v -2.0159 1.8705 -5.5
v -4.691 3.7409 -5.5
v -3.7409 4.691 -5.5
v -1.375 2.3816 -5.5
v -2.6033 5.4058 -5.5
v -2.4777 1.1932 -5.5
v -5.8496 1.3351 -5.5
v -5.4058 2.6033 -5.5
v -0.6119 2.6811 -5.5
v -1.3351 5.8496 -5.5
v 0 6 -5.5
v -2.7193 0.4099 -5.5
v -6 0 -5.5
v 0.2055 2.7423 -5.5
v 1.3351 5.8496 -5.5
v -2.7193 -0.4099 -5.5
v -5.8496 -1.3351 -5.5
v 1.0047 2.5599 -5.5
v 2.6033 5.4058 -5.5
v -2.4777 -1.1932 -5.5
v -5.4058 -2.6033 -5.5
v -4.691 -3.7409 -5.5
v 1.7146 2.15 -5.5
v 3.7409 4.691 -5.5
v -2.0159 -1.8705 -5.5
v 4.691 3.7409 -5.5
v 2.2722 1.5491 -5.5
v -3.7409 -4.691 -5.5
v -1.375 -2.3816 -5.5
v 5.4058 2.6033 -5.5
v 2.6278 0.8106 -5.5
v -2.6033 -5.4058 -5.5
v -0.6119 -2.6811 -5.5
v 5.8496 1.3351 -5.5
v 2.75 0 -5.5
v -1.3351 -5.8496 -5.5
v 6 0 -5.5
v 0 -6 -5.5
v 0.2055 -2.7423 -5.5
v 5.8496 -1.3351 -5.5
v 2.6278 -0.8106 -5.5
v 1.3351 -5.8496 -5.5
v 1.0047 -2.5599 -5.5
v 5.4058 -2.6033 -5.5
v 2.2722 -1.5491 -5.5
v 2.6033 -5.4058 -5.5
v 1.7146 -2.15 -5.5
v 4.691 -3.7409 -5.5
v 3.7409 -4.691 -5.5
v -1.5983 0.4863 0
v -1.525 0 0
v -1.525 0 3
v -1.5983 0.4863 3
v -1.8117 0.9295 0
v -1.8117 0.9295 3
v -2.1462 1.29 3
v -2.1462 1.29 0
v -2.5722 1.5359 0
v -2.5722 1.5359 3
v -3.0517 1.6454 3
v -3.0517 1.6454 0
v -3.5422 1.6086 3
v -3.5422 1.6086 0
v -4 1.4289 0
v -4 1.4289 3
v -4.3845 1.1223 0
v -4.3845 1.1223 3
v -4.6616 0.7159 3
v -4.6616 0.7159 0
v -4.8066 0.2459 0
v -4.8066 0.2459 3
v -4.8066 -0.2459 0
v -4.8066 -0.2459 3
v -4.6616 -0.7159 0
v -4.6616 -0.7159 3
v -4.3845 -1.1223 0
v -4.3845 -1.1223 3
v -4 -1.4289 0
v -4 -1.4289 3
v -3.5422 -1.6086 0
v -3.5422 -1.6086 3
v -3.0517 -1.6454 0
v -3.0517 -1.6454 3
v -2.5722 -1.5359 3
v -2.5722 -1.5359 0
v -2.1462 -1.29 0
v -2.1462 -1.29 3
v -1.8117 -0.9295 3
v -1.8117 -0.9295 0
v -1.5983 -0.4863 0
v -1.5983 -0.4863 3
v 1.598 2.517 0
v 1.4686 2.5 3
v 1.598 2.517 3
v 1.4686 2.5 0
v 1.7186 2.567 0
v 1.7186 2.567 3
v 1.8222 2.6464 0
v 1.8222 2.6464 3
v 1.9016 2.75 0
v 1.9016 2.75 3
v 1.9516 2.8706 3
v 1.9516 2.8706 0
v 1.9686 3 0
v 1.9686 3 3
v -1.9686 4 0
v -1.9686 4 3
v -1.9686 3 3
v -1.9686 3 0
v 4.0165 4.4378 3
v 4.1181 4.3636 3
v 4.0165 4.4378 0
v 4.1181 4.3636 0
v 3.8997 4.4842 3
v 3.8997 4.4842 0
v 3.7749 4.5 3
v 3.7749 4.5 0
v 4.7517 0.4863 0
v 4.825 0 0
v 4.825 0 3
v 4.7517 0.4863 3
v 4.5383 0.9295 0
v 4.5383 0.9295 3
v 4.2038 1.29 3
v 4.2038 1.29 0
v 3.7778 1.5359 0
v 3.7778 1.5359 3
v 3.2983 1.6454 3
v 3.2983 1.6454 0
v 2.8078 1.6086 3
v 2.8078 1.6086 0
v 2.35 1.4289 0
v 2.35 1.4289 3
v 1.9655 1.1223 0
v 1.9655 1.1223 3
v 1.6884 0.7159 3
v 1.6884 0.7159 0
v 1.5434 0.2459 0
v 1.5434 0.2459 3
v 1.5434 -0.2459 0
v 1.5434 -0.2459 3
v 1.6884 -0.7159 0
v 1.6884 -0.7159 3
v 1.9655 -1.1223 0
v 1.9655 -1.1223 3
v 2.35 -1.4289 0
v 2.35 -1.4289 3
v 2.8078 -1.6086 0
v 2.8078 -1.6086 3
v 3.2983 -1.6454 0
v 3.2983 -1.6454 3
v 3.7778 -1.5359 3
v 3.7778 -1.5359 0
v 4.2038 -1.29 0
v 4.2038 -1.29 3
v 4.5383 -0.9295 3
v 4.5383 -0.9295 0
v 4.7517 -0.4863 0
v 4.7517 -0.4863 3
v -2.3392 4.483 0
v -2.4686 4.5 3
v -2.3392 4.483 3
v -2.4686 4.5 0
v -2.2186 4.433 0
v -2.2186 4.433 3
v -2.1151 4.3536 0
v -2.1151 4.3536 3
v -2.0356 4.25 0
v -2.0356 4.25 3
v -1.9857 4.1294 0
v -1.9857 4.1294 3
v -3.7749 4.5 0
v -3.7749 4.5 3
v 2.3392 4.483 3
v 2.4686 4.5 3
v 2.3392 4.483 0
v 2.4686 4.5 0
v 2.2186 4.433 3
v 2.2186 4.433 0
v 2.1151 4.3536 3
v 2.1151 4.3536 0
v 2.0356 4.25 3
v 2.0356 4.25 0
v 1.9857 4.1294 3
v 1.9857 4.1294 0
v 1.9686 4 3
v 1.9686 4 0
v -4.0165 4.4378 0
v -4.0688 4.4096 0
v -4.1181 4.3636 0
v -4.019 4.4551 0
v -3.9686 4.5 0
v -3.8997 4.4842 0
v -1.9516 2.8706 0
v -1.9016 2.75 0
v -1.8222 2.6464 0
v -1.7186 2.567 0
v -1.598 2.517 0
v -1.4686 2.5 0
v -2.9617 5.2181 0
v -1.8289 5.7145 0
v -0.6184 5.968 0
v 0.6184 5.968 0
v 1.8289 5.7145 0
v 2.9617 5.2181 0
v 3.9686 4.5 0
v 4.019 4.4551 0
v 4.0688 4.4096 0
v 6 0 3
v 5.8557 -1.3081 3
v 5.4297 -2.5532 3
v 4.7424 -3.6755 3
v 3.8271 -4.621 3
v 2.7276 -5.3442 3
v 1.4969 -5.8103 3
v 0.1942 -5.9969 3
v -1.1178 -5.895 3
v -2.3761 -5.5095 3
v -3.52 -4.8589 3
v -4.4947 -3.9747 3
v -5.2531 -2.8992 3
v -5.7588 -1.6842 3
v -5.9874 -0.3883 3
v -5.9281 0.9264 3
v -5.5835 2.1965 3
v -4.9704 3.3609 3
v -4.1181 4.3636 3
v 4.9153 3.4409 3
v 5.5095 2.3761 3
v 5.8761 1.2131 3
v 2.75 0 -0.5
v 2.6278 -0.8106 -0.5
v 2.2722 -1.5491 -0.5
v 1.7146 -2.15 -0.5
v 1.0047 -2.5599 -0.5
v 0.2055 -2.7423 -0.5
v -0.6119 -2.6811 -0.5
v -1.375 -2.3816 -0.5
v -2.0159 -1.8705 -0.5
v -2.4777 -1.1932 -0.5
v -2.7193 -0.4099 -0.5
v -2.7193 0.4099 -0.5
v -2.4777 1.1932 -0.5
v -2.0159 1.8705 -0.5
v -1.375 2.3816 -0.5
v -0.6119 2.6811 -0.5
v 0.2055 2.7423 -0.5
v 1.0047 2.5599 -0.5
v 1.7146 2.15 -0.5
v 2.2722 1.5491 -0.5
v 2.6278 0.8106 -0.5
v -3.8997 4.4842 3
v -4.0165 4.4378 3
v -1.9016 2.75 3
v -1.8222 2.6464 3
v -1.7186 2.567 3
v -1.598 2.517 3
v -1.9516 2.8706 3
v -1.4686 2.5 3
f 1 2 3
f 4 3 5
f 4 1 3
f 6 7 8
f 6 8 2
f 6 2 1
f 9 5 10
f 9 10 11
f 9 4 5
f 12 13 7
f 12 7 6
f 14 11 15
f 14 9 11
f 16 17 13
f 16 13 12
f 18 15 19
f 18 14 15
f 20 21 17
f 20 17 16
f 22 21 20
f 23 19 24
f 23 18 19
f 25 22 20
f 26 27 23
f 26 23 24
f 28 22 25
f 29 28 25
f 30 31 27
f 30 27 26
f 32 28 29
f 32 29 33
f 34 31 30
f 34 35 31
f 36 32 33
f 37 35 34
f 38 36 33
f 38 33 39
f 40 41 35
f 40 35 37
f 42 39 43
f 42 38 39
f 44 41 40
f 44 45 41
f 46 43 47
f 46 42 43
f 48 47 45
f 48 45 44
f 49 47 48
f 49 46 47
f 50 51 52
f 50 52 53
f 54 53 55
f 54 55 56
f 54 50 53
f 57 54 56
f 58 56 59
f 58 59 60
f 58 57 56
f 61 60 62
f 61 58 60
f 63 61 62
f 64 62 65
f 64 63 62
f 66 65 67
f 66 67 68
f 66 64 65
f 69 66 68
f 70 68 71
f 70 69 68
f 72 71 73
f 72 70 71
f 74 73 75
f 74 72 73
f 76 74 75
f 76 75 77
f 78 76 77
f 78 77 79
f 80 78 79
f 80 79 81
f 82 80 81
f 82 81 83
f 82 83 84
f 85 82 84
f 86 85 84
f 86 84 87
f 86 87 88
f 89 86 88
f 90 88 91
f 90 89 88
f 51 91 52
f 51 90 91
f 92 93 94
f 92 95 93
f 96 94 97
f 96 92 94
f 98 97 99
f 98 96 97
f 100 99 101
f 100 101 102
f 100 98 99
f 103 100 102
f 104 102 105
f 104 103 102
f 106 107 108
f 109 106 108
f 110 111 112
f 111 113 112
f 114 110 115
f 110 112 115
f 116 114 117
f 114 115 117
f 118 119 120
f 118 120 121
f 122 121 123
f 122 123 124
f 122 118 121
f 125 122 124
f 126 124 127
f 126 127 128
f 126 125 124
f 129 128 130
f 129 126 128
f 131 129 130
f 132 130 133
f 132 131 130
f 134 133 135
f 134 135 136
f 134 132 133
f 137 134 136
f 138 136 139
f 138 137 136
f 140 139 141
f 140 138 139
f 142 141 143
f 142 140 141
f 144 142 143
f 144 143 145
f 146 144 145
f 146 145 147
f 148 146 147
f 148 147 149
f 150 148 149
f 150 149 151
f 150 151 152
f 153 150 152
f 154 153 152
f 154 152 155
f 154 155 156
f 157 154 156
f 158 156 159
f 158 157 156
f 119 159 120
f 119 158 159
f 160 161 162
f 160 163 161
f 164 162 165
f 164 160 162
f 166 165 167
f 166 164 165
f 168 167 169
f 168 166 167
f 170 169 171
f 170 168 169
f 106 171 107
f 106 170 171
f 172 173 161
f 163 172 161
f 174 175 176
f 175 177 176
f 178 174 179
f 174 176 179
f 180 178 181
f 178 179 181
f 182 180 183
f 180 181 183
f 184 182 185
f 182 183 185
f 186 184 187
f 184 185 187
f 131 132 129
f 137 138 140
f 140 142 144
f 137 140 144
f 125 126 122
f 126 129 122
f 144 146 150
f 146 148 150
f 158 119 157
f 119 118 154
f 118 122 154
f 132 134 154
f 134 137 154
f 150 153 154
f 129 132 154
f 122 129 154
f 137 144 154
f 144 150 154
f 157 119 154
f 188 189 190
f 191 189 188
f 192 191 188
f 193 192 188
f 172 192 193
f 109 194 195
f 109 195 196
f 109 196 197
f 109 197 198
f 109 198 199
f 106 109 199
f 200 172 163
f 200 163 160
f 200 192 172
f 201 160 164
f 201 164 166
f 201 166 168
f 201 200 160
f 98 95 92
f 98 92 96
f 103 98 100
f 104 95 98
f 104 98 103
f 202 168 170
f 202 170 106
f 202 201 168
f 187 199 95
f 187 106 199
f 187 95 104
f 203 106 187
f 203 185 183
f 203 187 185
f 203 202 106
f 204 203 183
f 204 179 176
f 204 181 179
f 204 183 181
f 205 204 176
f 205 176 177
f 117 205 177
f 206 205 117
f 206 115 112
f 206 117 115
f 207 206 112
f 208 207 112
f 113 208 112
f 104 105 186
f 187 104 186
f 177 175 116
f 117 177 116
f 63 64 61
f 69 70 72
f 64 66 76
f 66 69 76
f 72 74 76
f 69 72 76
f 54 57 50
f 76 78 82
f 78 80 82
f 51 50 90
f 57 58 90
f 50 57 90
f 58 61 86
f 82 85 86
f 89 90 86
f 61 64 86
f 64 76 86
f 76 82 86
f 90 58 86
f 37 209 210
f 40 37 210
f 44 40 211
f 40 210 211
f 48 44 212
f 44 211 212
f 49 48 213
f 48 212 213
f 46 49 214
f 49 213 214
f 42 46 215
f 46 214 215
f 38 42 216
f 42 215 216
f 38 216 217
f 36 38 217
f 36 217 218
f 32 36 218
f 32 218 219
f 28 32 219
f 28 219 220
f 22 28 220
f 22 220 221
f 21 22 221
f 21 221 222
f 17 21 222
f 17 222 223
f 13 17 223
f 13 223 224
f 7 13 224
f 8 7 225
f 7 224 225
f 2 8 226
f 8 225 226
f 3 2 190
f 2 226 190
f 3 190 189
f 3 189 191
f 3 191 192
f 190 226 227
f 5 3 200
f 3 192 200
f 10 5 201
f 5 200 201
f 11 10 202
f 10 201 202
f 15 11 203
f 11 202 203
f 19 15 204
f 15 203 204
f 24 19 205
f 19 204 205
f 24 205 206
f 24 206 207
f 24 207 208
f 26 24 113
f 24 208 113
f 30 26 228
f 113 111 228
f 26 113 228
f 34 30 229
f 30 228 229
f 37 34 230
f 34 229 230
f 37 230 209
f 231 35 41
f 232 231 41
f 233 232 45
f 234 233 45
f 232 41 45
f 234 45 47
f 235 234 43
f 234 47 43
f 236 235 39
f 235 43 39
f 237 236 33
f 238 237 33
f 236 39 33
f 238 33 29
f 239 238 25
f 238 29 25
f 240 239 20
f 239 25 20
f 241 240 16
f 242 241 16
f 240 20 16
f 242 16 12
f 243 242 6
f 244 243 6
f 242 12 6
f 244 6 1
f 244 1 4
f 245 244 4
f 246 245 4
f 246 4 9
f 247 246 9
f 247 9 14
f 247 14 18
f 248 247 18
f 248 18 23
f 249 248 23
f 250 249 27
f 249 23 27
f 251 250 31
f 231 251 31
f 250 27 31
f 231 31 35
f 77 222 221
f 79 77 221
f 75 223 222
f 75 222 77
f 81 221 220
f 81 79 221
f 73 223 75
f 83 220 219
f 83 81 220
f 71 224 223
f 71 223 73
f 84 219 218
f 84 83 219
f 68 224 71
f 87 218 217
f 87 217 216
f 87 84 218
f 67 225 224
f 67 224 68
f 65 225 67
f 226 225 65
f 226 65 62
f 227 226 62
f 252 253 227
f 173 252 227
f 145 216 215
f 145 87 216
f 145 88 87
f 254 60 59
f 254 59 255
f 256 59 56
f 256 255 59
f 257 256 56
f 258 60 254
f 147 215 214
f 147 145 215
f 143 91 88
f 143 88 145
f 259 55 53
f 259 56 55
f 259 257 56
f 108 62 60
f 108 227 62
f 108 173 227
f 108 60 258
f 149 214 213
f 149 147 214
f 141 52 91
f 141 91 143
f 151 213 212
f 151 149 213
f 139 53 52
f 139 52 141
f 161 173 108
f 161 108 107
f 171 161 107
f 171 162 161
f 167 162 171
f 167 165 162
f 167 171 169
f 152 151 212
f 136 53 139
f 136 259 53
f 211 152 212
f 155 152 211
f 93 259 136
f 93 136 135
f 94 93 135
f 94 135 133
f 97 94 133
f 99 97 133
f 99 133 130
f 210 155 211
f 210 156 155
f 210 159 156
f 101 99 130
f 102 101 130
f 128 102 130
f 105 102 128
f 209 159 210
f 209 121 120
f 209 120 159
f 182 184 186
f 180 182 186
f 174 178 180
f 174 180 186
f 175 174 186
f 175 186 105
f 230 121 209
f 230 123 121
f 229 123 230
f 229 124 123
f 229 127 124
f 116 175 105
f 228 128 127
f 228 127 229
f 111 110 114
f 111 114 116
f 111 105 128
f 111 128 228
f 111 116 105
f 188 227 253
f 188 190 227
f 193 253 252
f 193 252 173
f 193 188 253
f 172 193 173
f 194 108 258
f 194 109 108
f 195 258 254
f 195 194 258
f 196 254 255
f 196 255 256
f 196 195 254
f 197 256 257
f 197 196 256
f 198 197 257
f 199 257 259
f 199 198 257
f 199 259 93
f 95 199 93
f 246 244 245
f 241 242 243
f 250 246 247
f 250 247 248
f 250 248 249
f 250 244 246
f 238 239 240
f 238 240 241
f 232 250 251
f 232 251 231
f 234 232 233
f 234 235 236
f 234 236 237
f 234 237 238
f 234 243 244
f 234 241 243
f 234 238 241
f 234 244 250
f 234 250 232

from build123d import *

# Parameters (mm, degrees)
F0_R     = 6
F0_R_2   = 1.65
F1_DEPTH = 3
F2_R     = 6
F3_DEPTH = 5.5
F5_DEPTH = 3
F6_R     = 0.5
F7_R     = 2.75
F8_DEPTH = 5


with BuildPart() as f1:
    # F0 (on Top) → F1 (new body)
    with BuildSketch(Plane.XY):
        Circle(F0_R)
        with Locations((-3.175, 0)):
            Circle(F0_R_2, mode=Mode.SUBTRACT)
        with Locations((3.175, 0)):
            Circle(F0_R_2, mode=Mode.SUBTRACT)
    extrude(amount=F1_DEPTH)

    # F2 (on face) → F3 (join)
    with BuildSketch(Plane(origin=(0, 0, 0), x_dir=(1, 0, 0), z_dir=(0, 0, -1))):
        Circle(F2_R)
    extrude(amount=F3_DEPTH)

    # F4 (on face) → F5 (cut)
    with BuildSketch(Plane.XY.offset(3)):
        with BuildLine():
            ThreePointArc((3.968627, 4.5), (0, 6), (-3.968627, 4.5))
            Line((-3.968627, 4.5), (-1.968627, 4.5))
            Line((-1.968627, 4.5), (-1.968627, 2.5))
            Line((-1.968627, 2.5), (1.968627, 2.5))
            Line((1.968627, 2.5), (1.968627, 4.5))
            Line((1.968627, 4.5), (3.968627, 4.5))
        make_face()
    extrude(amount=-F5_DEPTH, mode=Mode.SUBTRACT)

    # F6
    f6_edges = [f1.edges().sort_by_distance(p)[0] for p in [
        (-3.968627, 4.5, 1.5),
        (-1.968627, 4.5, 1.5),
        (1.968627, 2.5, 1.5),
        (1.968627, 4.5, 1.5),
        (3.968627, 4.5, 1.5),
        (-1.968627, 2.5, 1.5),
    ]]
    fillet(f6_edges, radius=F6_R)

    # F7 (on face) → F8 (cut)
    with BuildSketch(Plane(origin=(0, 0, -5.5), x_dir=(1, 0, 0), z_dir=(0, 0, -1))):
        Circle(F7_R)
    extrude(amount=-F8_DEPTH, mode=Mode.SUBTRACT)


solid = f1.part
